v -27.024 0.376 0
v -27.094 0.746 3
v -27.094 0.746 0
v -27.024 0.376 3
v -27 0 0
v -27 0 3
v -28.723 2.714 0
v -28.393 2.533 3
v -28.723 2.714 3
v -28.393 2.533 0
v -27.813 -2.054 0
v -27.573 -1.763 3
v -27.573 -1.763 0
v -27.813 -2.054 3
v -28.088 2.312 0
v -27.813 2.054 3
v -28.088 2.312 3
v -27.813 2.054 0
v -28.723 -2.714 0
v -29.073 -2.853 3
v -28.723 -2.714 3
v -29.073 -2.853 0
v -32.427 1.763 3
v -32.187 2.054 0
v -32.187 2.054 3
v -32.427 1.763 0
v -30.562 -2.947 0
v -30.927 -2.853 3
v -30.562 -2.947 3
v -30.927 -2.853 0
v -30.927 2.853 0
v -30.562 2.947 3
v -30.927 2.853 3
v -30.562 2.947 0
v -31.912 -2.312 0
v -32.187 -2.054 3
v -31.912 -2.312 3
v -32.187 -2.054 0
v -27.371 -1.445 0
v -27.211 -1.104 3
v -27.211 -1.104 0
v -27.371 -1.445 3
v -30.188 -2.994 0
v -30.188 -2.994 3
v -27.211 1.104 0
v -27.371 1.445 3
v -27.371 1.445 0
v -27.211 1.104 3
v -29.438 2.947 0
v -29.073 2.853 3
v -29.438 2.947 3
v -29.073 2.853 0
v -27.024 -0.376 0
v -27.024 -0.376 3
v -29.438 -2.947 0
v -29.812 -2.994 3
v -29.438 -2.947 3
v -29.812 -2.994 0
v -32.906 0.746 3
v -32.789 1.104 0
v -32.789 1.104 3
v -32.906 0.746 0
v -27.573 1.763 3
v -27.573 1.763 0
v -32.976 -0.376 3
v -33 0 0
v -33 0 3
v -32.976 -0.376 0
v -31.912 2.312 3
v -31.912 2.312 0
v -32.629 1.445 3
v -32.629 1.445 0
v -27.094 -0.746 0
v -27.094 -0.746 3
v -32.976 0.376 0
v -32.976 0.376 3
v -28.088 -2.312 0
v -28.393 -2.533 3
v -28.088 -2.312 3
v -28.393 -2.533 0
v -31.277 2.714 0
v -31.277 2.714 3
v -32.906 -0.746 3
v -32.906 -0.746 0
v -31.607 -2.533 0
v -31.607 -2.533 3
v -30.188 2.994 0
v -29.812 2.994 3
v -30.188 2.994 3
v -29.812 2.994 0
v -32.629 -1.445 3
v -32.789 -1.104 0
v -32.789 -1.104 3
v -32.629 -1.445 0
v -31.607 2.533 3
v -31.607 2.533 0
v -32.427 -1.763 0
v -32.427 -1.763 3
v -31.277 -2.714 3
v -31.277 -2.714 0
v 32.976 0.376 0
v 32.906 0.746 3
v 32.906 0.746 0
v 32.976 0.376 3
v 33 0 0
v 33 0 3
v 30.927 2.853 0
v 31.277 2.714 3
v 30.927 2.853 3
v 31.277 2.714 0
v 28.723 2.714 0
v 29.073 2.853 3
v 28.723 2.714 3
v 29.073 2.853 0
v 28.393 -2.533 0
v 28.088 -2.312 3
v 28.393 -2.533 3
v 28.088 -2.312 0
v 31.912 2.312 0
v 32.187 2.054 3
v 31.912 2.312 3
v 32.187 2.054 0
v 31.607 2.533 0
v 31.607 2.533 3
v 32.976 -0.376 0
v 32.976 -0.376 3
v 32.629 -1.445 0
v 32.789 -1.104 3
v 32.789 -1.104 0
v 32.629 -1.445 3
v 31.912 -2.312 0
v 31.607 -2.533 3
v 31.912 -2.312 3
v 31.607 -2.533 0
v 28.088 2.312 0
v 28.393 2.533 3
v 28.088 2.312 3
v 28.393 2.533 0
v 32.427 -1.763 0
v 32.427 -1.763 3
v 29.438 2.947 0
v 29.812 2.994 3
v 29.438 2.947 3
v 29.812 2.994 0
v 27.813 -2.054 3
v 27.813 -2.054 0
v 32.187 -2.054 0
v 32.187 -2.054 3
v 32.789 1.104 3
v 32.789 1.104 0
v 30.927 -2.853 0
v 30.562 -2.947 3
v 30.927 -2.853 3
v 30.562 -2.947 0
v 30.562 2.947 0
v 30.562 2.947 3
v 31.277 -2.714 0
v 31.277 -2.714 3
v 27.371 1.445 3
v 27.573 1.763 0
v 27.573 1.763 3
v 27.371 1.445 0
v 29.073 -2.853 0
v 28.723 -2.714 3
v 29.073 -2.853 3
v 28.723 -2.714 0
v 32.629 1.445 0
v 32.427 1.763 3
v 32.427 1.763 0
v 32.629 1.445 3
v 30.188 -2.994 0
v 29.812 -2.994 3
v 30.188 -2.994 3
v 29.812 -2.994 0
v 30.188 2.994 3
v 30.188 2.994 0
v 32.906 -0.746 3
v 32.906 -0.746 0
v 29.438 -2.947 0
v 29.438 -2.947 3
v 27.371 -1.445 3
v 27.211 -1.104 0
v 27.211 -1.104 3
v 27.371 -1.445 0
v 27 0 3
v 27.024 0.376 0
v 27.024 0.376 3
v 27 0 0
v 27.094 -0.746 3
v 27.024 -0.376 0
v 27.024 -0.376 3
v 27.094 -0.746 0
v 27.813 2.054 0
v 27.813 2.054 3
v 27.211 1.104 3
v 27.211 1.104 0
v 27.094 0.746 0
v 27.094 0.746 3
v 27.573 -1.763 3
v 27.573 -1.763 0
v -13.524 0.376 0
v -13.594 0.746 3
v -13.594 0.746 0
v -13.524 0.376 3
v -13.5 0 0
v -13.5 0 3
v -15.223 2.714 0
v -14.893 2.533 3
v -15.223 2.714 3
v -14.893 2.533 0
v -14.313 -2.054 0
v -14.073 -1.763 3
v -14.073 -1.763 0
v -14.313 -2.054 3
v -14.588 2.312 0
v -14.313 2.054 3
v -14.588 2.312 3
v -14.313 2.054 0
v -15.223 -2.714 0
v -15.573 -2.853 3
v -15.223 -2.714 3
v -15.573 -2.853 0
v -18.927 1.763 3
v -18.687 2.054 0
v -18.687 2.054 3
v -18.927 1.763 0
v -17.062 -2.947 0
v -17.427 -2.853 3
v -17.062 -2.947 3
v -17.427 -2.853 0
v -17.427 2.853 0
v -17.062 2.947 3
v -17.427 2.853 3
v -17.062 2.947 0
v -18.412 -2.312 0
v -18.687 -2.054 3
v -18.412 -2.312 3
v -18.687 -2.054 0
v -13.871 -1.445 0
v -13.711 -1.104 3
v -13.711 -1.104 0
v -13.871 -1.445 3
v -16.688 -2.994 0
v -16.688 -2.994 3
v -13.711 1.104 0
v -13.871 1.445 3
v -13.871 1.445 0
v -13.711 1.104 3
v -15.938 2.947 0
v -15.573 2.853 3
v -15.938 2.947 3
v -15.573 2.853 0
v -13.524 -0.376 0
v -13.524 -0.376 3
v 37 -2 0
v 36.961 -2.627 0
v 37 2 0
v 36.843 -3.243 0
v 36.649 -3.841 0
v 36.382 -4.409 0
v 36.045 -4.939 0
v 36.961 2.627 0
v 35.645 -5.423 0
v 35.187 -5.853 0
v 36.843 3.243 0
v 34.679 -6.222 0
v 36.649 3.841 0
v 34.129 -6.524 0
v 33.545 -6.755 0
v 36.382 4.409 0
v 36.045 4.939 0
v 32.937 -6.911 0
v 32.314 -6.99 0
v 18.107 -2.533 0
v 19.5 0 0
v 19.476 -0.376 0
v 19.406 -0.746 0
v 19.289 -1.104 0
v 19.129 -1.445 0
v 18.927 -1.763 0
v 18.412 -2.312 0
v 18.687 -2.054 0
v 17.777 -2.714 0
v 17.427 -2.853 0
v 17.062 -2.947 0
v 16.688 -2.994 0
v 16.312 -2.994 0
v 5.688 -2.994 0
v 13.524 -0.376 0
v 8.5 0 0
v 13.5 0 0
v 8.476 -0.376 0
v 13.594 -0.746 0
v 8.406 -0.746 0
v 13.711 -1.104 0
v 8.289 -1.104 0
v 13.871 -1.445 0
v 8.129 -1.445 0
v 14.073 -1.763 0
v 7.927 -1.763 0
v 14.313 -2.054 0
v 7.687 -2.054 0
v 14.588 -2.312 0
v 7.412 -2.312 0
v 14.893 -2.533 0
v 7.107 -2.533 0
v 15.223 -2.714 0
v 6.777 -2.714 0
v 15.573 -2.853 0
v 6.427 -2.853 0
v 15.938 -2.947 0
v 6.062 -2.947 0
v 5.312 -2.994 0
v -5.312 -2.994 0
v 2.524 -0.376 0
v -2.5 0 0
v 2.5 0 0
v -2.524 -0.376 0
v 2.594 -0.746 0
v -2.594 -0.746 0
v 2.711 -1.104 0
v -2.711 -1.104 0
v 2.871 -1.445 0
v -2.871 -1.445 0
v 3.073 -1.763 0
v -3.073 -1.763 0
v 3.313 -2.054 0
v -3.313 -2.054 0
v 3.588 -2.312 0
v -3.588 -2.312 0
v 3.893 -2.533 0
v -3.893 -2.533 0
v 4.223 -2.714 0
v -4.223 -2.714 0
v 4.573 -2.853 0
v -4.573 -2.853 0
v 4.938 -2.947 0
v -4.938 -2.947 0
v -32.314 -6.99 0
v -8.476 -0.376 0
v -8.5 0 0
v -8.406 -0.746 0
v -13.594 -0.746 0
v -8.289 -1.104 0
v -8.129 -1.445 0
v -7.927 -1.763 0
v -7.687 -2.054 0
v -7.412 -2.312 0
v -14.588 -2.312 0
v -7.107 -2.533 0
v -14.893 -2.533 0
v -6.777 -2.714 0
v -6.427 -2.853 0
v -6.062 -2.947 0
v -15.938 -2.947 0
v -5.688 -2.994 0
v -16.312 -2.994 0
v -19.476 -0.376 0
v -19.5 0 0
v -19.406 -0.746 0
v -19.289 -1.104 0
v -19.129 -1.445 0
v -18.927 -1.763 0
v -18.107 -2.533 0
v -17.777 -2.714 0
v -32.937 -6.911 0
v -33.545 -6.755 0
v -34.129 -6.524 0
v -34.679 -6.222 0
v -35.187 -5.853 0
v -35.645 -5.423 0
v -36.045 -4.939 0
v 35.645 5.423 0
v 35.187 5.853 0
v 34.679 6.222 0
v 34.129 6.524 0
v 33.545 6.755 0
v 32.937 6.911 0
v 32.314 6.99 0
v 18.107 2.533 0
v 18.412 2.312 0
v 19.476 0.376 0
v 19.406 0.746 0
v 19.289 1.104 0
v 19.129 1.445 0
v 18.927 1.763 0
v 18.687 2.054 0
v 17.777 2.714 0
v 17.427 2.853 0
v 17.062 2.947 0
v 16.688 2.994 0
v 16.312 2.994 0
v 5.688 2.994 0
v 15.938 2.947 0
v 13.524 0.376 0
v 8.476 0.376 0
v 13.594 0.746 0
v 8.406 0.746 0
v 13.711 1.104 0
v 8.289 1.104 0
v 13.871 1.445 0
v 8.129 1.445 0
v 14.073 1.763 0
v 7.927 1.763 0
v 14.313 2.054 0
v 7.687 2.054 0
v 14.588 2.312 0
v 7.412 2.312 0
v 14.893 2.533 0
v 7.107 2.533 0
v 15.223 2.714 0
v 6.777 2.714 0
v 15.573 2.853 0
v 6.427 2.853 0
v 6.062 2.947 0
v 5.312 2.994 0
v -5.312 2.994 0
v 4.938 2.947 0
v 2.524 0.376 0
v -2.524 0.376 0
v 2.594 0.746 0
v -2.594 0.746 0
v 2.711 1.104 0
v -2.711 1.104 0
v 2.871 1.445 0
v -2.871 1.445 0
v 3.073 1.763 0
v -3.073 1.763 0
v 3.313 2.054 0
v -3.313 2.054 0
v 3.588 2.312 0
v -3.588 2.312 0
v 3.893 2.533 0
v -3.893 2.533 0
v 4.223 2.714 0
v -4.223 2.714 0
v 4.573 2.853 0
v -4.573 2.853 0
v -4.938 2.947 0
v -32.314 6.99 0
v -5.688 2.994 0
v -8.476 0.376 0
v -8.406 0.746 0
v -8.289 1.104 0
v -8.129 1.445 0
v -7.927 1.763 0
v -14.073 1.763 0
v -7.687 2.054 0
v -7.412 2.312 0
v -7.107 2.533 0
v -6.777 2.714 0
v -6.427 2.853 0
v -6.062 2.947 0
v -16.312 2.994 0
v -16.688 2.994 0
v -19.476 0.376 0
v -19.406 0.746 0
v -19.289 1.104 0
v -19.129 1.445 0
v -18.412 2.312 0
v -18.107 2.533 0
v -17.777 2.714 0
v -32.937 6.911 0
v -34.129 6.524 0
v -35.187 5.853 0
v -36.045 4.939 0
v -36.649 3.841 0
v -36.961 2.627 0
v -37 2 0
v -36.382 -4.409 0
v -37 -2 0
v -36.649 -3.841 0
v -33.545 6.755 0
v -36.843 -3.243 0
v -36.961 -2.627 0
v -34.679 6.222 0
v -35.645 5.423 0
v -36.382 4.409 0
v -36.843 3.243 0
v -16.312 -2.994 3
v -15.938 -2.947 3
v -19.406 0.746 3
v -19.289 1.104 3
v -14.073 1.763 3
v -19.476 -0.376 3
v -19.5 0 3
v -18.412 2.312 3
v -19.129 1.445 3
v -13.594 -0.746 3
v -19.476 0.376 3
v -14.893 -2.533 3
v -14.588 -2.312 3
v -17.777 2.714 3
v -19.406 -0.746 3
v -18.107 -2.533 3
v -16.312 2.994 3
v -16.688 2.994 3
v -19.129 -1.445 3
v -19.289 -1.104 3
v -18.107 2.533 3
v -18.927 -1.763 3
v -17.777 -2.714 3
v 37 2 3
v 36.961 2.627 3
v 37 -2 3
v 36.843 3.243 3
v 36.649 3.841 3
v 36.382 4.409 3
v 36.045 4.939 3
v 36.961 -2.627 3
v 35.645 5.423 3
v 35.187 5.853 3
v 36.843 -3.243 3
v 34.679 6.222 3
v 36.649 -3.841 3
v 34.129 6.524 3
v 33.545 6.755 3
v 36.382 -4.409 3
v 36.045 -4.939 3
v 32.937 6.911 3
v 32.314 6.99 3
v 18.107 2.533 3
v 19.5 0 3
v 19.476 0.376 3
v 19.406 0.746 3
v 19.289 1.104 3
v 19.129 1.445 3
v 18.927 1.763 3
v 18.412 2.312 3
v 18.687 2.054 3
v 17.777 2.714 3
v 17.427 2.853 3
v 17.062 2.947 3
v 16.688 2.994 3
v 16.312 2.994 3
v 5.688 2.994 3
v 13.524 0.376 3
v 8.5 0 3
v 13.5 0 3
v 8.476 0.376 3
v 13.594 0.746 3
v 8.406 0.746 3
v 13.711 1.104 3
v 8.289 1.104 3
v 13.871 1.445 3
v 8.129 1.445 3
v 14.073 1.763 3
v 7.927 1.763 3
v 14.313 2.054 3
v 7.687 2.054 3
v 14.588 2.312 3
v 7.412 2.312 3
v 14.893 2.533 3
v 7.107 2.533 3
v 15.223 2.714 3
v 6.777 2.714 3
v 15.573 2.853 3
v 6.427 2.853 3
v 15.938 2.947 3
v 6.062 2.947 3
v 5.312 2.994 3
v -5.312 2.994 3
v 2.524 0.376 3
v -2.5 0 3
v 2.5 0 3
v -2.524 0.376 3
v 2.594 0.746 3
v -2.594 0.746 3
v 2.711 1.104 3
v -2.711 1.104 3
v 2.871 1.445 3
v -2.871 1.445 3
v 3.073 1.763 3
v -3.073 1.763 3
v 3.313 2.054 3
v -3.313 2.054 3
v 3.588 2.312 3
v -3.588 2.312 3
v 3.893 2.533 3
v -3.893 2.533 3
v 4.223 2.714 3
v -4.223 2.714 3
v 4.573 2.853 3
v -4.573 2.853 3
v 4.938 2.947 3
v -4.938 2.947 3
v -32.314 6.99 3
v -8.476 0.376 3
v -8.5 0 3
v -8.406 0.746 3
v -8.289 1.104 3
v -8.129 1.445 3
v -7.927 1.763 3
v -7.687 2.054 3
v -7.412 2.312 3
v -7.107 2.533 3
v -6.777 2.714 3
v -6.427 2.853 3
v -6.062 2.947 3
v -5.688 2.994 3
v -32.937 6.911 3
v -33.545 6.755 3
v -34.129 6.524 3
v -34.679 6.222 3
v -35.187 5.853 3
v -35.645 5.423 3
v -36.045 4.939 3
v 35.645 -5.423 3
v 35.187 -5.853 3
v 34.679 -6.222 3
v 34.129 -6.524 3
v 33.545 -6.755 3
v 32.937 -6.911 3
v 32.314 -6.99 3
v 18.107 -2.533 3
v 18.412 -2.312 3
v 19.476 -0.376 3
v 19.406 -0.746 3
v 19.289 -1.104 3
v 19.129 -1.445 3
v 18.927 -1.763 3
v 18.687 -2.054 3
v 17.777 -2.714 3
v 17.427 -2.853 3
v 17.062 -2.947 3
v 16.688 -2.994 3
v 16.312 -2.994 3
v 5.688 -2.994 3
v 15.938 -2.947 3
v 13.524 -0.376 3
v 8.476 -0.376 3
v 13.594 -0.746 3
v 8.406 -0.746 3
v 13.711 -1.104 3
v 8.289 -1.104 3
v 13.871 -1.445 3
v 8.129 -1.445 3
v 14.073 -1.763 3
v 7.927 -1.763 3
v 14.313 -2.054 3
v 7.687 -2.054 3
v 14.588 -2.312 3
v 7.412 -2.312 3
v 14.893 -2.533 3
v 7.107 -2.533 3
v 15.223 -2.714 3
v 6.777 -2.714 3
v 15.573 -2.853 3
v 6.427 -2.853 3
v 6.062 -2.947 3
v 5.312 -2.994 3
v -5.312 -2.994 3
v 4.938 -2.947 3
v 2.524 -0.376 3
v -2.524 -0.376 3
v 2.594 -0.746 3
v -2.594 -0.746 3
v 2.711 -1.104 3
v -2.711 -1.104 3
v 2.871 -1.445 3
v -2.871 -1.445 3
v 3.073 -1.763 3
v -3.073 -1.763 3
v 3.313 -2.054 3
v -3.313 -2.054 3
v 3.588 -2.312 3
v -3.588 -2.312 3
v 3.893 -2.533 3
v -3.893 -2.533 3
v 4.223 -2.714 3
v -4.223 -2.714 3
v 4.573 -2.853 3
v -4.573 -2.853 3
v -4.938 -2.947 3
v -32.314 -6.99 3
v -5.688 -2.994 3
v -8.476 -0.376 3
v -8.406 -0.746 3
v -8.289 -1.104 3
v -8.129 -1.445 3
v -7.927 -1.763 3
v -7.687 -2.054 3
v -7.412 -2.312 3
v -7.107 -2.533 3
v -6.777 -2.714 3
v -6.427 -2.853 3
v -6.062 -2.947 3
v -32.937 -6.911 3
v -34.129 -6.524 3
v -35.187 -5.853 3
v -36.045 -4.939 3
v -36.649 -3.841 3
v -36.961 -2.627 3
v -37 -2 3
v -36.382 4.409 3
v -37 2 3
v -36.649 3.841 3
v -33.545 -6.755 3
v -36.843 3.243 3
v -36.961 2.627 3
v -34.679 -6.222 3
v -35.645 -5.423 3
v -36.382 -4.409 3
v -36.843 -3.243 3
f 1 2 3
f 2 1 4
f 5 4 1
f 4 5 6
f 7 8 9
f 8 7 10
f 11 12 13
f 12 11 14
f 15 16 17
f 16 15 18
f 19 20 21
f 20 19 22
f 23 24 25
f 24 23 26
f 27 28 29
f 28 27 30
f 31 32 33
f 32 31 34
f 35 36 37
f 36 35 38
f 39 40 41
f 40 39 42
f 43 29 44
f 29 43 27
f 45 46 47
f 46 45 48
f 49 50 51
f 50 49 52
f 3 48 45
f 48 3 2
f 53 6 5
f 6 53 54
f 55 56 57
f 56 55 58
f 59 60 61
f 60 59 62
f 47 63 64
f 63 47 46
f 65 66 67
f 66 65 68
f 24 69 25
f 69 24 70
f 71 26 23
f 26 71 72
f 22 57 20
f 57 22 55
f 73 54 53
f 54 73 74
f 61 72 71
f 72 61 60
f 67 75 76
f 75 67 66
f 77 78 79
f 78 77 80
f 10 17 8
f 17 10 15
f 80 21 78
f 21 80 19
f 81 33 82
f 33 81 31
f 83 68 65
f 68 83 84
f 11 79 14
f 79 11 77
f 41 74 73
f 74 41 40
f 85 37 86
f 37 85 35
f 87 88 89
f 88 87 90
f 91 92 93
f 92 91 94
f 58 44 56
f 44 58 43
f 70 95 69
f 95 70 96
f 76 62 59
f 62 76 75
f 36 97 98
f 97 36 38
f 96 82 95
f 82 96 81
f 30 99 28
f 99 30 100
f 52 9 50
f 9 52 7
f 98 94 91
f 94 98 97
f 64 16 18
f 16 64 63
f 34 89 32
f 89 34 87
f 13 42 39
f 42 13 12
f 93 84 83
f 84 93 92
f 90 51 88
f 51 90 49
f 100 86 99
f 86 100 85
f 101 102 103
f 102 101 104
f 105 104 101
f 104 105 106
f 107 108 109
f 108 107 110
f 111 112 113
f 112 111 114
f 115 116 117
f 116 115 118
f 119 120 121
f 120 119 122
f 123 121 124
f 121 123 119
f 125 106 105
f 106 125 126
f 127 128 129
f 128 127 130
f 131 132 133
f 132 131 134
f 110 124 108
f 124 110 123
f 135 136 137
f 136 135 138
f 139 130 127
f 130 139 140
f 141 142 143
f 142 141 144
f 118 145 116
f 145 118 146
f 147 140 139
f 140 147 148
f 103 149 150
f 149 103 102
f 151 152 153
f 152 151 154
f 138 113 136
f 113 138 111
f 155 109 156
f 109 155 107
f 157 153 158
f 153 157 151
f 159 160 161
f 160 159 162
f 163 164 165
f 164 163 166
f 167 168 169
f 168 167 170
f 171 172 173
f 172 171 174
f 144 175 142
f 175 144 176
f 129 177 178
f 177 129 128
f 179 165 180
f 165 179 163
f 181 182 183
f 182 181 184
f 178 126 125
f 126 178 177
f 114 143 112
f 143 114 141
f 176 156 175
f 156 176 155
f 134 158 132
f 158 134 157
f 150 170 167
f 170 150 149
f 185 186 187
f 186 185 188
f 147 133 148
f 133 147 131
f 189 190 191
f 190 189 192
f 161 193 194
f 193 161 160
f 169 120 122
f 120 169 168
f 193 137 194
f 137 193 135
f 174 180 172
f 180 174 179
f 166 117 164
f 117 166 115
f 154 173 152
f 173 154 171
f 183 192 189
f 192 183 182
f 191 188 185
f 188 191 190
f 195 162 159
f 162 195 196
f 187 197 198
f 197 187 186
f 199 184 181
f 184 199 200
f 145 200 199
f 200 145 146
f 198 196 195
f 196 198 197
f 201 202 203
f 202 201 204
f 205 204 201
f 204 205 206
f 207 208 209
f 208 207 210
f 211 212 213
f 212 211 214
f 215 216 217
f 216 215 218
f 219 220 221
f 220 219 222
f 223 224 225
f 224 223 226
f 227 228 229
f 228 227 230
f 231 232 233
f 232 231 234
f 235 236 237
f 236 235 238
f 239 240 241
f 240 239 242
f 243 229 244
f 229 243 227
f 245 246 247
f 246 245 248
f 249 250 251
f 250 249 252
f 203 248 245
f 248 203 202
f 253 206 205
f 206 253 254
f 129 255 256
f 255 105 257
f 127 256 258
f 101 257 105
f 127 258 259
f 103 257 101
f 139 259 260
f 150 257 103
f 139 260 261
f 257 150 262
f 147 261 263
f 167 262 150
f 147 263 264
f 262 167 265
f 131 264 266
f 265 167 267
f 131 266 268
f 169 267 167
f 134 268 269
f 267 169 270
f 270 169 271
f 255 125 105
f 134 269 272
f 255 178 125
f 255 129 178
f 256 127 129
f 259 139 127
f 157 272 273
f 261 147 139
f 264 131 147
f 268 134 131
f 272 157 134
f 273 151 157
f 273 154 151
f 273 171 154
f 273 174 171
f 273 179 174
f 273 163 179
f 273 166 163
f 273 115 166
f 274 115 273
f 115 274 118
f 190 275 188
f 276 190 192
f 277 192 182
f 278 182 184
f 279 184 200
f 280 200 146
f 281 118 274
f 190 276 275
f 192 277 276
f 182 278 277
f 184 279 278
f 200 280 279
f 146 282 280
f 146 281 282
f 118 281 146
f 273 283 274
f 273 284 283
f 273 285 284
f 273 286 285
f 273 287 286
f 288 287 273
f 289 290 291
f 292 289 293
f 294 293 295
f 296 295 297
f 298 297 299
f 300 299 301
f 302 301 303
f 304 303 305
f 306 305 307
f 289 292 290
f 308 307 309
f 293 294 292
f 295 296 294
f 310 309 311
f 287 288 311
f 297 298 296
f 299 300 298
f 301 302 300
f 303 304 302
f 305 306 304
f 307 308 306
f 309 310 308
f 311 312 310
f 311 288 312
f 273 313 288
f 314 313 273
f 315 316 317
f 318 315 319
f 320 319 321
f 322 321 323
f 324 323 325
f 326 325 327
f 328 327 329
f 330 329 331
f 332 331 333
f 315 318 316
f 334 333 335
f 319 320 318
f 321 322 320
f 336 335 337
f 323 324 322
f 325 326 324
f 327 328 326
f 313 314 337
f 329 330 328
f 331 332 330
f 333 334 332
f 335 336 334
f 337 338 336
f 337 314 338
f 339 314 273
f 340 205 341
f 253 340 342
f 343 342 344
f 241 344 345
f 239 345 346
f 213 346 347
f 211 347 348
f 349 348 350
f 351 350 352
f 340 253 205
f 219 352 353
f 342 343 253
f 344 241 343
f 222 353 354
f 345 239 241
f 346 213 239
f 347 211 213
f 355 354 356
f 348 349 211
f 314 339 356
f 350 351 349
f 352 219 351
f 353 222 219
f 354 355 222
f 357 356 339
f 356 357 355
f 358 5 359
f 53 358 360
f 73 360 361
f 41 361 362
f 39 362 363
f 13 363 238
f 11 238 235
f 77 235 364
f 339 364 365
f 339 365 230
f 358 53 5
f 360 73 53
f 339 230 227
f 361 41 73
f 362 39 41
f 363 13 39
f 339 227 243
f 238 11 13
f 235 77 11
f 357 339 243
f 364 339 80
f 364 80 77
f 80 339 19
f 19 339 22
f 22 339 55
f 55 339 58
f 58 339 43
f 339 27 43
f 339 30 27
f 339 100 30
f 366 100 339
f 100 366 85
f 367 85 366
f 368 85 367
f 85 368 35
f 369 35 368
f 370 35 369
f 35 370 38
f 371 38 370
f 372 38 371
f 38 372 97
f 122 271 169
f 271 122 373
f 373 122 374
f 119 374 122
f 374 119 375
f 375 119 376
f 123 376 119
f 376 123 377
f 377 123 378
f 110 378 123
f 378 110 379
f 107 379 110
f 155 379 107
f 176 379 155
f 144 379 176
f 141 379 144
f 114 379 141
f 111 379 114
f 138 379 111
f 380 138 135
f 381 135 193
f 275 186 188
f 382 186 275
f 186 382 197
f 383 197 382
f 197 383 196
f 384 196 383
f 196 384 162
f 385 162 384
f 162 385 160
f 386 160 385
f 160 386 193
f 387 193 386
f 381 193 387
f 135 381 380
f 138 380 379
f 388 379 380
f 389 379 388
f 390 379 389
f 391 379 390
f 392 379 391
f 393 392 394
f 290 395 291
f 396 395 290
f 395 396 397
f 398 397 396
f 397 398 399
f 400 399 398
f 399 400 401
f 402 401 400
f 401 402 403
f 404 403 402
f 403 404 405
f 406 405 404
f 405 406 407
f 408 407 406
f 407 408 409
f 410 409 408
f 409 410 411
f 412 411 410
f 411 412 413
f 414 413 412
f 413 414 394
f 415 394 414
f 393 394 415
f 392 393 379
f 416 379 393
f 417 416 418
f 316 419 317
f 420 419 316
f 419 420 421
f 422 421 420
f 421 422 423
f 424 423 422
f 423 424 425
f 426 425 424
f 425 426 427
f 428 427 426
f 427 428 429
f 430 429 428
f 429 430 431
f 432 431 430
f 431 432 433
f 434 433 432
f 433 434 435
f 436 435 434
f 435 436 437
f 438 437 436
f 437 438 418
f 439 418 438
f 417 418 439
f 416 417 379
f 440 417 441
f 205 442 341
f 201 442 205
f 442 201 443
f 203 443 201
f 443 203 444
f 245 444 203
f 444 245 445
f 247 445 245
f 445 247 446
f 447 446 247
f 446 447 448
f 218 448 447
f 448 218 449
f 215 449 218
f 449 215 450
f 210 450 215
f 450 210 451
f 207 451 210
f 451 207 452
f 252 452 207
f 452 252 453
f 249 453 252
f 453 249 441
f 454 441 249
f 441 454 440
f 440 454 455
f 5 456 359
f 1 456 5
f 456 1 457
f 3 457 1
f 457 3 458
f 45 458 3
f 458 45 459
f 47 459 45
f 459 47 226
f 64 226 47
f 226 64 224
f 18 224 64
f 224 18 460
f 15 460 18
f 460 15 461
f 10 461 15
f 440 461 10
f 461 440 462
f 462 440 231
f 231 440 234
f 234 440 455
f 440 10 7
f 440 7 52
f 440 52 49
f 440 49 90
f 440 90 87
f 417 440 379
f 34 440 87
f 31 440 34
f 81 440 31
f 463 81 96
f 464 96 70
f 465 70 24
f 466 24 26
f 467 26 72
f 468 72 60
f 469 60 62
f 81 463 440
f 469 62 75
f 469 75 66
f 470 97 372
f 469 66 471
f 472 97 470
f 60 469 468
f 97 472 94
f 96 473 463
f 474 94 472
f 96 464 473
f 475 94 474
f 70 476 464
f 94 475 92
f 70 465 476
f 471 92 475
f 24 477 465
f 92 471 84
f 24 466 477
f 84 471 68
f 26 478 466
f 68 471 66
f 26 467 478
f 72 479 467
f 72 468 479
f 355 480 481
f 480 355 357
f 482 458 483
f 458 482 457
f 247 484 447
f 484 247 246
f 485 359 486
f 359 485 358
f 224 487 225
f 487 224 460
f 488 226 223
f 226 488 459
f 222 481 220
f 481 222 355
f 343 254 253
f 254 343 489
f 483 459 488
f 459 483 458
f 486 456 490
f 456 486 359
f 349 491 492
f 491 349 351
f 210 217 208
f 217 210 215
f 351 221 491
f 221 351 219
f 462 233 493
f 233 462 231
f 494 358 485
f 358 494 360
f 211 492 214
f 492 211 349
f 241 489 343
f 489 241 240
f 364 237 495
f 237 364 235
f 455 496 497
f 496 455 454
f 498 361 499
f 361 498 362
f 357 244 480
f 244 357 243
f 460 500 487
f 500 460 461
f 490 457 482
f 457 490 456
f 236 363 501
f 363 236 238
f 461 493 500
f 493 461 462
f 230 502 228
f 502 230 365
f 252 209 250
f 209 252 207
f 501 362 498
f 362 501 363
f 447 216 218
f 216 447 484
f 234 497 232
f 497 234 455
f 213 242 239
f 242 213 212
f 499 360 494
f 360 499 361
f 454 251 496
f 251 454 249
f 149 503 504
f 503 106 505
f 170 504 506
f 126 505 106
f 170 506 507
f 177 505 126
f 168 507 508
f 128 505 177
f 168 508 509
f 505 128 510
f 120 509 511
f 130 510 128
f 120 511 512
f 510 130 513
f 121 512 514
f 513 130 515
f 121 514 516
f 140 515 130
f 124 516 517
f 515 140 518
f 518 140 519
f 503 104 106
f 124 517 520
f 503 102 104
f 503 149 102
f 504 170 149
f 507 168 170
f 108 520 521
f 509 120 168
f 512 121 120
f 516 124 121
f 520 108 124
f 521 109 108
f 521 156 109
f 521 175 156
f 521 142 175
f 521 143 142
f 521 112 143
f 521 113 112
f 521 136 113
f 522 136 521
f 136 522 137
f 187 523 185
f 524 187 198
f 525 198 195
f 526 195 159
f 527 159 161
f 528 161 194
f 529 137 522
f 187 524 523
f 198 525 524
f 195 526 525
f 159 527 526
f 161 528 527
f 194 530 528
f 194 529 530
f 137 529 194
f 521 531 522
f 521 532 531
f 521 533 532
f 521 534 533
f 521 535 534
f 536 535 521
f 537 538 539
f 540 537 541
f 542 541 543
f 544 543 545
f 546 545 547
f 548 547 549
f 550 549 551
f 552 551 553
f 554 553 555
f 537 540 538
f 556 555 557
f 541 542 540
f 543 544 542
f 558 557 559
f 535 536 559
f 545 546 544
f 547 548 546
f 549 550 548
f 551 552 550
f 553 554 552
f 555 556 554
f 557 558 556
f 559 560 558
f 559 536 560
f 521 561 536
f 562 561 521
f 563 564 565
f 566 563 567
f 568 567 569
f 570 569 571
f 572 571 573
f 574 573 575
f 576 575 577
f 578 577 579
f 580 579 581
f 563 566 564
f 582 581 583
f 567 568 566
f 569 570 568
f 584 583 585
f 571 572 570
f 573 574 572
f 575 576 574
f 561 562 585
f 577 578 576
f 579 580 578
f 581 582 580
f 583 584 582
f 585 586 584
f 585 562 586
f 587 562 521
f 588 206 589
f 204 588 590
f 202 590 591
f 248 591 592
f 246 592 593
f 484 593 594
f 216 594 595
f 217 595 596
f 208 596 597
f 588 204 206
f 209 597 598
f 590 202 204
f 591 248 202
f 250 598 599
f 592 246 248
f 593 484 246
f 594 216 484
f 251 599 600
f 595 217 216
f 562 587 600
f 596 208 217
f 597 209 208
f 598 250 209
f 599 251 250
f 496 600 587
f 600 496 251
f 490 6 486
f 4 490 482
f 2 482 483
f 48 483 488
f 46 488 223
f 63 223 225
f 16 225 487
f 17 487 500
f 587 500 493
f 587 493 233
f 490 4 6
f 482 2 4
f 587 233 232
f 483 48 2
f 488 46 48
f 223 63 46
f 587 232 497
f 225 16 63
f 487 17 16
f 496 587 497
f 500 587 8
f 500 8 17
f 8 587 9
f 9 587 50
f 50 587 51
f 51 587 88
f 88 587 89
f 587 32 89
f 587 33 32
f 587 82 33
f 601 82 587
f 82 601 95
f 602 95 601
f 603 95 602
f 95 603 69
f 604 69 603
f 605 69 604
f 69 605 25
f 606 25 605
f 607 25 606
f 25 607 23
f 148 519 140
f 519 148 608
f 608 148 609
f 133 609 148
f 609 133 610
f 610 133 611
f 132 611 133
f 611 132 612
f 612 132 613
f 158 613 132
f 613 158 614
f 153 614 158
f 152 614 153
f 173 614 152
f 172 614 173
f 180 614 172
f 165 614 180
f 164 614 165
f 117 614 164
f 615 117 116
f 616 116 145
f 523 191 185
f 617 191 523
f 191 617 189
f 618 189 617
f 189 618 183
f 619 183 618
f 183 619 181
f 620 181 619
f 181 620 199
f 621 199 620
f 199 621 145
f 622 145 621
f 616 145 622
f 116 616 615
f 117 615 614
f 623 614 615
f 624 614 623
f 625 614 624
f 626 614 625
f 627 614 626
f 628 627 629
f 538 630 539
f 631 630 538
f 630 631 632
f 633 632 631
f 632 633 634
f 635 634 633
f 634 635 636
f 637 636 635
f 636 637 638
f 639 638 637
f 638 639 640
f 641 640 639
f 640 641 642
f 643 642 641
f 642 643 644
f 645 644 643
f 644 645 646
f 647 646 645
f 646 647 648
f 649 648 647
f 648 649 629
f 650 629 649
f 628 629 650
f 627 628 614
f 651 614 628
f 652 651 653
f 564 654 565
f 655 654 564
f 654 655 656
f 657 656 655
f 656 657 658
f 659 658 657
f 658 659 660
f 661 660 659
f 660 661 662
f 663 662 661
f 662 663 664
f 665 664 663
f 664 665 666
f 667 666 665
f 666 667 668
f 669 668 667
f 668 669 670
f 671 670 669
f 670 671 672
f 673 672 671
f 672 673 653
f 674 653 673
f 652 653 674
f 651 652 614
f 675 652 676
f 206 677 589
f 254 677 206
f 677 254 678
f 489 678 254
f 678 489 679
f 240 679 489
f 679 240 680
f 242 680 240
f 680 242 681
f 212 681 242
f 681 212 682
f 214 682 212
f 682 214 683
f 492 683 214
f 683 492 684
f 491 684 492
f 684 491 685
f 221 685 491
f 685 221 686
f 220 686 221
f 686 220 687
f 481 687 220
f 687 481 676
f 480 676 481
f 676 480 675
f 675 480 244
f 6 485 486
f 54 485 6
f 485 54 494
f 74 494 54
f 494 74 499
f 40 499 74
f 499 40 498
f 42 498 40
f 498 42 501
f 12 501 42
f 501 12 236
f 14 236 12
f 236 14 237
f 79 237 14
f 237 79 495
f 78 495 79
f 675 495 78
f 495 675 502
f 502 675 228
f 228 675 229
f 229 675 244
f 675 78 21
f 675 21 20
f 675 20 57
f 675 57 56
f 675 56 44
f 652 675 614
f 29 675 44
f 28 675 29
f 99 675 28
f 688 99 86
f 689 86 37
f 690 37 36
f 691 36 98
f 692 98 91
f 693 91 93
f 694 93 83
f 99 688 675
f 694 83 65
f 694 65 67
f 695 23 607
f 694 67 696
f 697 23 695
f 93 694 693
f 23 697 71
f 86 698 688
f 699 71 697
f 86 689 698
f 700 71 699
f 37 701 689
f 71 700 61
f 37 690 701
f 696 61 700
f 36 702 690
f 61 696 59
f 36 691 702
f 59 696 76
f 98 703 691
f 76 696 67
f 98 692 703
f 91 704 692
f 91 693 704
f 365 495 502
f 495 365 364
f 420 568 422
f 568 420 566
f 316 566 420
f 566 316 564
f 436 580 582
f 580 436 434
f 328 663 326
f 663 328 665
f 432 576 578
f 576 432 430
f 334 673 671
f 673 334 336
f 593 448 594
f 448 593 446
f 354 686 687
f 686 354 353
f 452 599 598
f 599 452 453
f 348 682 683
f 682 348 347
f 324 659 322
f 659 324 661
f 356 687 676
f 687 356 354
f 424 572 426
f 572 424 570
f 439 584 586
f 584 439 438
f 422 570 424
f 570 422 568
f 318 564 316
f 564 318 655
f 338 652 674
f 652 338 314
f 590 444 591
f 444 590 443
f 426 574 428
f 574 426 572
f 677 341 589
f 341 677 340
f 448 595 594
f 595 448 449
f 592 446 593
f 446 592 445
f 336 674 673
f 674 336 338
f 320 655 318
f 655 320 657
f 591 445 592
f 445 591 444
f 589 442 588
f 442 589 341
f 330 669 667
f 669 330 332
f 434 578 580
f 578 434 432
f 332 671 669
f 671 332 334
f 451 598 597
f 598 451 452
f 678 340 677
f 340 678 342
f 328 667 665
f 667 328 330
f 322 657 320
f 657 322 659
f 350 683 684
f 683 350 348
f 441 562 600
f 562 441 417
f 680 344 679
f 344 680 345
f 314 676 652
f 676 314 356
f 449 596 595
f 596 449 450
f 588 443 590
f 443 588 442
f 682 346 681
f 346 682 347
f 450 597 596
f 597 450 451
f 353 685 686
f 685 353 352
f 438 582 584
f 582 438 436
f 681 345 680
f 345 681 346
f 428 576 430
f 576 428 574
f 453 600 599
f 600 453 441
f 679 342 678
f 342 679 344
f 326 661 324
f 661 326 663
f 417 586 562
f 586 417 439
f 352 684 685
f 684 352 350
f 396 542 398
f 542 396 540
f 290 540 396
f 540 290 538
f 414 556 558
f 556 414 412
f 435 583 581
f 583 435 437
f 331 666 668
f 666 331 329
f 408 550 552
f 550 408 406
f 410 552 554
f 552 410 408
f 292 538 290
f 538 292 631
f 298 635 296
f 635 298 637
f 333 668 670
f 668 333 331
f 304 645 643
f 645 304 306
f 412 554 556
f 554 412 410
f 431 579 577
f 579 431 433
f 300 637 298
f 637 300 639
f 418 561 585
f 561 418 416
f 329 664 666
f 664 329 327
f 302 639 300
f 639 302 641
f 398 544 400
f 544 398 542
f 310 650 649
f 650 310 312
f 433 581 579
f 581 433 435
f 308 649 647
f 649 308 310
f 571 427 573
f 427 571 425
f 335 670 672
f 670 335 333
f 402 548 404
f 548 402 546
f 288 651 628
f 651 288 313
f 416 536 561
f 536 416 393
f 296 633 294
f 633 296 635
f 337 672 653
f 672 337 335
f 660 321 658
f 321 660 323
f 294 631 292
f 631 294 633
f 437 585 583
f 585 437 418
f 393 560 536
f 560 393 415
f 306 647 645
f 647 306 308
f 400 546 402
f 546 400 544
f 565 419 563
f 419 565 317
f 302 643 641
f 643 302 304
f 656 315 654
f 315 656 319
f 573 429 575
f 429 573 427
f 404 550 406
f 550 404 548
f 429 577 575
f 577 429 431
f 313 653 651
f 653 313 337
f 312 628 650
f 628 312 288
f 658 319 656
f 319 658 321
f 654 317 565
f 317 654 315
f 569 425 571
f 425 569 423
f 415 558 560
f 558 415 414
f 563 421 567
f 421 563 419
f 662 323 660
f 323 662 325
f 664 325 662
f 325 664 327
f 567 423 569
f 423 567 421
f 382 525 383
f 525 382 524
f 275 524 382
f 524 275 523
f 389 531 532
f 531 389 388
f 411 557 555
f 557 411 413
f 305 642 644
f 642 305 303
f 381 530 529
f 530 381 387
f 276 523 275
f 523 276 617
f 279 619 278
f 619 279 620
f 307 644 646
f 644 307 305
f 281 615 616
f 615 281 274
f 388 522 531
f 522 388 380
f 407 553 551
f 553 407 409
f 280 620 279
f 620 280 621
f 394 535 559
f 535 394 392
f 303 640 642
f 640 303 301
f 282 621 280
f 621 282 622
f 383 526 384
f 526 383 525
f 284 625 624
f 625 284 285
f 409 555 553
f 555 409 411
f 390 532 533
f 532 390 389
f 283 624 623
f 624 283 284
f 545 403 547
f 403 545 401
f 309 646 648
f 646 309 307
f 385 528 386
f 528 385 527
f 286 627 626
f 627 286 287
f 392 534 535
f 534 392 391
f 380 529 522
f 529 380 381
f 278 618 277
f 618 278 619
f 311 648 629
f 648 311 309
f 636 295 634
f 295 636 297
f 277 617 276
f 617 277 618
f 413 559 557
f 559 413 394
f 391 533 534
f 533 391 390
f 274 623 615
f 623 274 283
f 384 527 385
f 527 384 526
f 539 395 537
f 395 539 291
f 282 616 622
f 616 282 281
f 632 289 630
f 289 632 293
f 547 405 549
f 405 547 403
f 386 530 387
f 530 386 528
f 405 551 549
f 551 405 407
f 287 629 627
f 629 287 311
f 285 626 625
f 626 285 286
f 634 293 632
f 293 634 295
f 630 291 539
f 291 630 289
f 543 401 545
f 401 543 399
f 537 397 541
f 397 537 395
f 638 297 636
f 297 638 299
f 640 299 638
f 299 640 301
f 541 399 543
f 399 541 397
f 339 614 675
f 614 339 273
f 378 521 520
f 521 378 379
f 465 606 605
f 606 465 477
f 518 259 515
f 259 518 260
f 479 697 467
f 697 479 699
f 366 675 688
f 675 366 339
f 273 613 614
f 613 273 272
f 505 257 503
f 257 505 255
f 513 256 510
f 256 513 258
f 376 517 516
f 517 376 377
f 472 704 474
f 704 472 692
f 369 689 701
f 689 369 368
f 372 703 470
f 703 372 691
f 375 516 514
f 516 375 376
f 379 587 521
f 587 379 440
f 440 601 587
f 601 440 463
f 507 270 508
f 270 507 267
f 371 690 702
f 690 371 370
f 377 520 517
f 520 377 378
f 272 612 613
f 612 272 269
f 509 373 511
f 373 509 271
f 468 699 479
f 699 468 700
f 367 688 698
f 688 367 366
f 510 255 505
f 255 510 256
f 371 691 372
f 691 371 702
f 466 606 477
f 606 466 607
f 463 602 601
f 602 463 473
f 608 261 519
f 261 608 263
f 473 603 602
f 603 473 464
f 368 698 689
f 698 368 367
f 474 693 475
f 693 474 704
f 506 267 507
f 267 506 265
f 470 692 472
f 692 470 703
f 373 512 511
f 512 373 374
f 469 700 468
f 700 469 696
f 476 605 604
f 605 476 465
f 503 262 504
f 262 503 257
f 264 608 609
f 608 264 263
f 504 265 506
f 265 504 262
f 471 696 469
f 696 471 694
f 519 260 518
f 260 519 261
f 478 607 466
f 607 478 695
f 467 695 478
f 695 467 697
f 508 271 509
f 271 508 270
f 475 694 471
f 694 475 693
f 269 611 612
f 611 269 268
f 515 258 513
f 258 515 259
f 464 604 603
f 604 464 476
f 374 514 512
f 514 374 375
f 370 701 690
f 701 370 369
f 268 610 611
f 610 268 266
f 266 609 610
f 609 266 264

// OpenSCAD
$fn = 50;


difference() {
	union() {
		hull() {
			translate(v = [-32.0000000000, 2.0000000000, 0]) {
				cylinder(h = 3, r = 5);
			}
			translate(v = [32.0000000000, 2.0000000000, 0]) {
				cylinder(h = 3, r = 5);
			}
			translate(v = [-32.0000000000, -2.0000000000, 0]) {
				cylinder(h = 3, r = 5);
			}
			translate(v = [32.0000000000, -2.0000000000, 0]) {
				cylinder(h = 3, r = 5);
			}
		}
	}
	union() {
		#translate(v = [-30.0000000000, 0.0000000000, 0]) {
			cylinder(h = 3, r = 3.0000000000);
		}
		#translate(v = [30.0000000000, 0.0000000000, 0]) {
			cylinder(h = 3, r = 3.0000000000);
		}
		#translate(v = [-30.0000000000, 0.0000000000, -100.0000000000]) {
			cylinder(h = 200, r = 3.0000000000);
		}
		#translate(v = [-30.0000000000, 0.0000000000, -100.0000000000]) {
			cylinder(h = 200, r = 3.0000000000);
		}
		#translate(v = [30.0000000000, 0.0000000000, -100.0000000000]) {
			cylinder(h = 200, r = 3.0000000000);
		}
		#translate(v = [30.0000000000, 0.0000000000, -100.0000000000]) {
			cylinder(h = 200, r = 3.0000000000);
		}
		#translate(v = [-30.0000000000, 0.0000000000, 0]) {
			cylinder(h = 3, r = 1.5000000000);
		}
		#translate(v = [30.0000000000, 0.0000000000, 0]) {
			cylinder(h = 3, r = 1.5000000000);
		}
		#translate(v = [-30.0000000000, 0.0000000000, 0]) {
			cylinder(h = 3, r = 1.5000000000);
		}
		#translate(v = [30.0000000000, 0.0000000000, 0]) {
			cylinder(h = 3, r = 1.5000000000);
		}
		#translate(v = [-30.0000000000, 0.0000000000, 0]) {
			cylinder(h = 3, r = 1.5000000000);
		}
		#translate(v = [30.0000000000, 0.0000000000, 0]) {
			cylinder(h = 3, r = 1.5000000000);
		}
		#translate(v = [-16.5000000000, 0, 0]) {
			cylinder(h = 3, r = 3.0000000000);
		}
		#translate(v = [-5.5000000000, 0, 0]) {
			cylinder(h = 3, r = 3.0000000000);
		}
		#translate(v = [5.5000000000, 0, 0]) {
			cylinder(h = 3, r = 3.0000000000);
		}
		#translate(v = [16.5000000000, 0, 0]) {
			cylinder(h = 3, r = 3.0000000000);
		}
	}
}
